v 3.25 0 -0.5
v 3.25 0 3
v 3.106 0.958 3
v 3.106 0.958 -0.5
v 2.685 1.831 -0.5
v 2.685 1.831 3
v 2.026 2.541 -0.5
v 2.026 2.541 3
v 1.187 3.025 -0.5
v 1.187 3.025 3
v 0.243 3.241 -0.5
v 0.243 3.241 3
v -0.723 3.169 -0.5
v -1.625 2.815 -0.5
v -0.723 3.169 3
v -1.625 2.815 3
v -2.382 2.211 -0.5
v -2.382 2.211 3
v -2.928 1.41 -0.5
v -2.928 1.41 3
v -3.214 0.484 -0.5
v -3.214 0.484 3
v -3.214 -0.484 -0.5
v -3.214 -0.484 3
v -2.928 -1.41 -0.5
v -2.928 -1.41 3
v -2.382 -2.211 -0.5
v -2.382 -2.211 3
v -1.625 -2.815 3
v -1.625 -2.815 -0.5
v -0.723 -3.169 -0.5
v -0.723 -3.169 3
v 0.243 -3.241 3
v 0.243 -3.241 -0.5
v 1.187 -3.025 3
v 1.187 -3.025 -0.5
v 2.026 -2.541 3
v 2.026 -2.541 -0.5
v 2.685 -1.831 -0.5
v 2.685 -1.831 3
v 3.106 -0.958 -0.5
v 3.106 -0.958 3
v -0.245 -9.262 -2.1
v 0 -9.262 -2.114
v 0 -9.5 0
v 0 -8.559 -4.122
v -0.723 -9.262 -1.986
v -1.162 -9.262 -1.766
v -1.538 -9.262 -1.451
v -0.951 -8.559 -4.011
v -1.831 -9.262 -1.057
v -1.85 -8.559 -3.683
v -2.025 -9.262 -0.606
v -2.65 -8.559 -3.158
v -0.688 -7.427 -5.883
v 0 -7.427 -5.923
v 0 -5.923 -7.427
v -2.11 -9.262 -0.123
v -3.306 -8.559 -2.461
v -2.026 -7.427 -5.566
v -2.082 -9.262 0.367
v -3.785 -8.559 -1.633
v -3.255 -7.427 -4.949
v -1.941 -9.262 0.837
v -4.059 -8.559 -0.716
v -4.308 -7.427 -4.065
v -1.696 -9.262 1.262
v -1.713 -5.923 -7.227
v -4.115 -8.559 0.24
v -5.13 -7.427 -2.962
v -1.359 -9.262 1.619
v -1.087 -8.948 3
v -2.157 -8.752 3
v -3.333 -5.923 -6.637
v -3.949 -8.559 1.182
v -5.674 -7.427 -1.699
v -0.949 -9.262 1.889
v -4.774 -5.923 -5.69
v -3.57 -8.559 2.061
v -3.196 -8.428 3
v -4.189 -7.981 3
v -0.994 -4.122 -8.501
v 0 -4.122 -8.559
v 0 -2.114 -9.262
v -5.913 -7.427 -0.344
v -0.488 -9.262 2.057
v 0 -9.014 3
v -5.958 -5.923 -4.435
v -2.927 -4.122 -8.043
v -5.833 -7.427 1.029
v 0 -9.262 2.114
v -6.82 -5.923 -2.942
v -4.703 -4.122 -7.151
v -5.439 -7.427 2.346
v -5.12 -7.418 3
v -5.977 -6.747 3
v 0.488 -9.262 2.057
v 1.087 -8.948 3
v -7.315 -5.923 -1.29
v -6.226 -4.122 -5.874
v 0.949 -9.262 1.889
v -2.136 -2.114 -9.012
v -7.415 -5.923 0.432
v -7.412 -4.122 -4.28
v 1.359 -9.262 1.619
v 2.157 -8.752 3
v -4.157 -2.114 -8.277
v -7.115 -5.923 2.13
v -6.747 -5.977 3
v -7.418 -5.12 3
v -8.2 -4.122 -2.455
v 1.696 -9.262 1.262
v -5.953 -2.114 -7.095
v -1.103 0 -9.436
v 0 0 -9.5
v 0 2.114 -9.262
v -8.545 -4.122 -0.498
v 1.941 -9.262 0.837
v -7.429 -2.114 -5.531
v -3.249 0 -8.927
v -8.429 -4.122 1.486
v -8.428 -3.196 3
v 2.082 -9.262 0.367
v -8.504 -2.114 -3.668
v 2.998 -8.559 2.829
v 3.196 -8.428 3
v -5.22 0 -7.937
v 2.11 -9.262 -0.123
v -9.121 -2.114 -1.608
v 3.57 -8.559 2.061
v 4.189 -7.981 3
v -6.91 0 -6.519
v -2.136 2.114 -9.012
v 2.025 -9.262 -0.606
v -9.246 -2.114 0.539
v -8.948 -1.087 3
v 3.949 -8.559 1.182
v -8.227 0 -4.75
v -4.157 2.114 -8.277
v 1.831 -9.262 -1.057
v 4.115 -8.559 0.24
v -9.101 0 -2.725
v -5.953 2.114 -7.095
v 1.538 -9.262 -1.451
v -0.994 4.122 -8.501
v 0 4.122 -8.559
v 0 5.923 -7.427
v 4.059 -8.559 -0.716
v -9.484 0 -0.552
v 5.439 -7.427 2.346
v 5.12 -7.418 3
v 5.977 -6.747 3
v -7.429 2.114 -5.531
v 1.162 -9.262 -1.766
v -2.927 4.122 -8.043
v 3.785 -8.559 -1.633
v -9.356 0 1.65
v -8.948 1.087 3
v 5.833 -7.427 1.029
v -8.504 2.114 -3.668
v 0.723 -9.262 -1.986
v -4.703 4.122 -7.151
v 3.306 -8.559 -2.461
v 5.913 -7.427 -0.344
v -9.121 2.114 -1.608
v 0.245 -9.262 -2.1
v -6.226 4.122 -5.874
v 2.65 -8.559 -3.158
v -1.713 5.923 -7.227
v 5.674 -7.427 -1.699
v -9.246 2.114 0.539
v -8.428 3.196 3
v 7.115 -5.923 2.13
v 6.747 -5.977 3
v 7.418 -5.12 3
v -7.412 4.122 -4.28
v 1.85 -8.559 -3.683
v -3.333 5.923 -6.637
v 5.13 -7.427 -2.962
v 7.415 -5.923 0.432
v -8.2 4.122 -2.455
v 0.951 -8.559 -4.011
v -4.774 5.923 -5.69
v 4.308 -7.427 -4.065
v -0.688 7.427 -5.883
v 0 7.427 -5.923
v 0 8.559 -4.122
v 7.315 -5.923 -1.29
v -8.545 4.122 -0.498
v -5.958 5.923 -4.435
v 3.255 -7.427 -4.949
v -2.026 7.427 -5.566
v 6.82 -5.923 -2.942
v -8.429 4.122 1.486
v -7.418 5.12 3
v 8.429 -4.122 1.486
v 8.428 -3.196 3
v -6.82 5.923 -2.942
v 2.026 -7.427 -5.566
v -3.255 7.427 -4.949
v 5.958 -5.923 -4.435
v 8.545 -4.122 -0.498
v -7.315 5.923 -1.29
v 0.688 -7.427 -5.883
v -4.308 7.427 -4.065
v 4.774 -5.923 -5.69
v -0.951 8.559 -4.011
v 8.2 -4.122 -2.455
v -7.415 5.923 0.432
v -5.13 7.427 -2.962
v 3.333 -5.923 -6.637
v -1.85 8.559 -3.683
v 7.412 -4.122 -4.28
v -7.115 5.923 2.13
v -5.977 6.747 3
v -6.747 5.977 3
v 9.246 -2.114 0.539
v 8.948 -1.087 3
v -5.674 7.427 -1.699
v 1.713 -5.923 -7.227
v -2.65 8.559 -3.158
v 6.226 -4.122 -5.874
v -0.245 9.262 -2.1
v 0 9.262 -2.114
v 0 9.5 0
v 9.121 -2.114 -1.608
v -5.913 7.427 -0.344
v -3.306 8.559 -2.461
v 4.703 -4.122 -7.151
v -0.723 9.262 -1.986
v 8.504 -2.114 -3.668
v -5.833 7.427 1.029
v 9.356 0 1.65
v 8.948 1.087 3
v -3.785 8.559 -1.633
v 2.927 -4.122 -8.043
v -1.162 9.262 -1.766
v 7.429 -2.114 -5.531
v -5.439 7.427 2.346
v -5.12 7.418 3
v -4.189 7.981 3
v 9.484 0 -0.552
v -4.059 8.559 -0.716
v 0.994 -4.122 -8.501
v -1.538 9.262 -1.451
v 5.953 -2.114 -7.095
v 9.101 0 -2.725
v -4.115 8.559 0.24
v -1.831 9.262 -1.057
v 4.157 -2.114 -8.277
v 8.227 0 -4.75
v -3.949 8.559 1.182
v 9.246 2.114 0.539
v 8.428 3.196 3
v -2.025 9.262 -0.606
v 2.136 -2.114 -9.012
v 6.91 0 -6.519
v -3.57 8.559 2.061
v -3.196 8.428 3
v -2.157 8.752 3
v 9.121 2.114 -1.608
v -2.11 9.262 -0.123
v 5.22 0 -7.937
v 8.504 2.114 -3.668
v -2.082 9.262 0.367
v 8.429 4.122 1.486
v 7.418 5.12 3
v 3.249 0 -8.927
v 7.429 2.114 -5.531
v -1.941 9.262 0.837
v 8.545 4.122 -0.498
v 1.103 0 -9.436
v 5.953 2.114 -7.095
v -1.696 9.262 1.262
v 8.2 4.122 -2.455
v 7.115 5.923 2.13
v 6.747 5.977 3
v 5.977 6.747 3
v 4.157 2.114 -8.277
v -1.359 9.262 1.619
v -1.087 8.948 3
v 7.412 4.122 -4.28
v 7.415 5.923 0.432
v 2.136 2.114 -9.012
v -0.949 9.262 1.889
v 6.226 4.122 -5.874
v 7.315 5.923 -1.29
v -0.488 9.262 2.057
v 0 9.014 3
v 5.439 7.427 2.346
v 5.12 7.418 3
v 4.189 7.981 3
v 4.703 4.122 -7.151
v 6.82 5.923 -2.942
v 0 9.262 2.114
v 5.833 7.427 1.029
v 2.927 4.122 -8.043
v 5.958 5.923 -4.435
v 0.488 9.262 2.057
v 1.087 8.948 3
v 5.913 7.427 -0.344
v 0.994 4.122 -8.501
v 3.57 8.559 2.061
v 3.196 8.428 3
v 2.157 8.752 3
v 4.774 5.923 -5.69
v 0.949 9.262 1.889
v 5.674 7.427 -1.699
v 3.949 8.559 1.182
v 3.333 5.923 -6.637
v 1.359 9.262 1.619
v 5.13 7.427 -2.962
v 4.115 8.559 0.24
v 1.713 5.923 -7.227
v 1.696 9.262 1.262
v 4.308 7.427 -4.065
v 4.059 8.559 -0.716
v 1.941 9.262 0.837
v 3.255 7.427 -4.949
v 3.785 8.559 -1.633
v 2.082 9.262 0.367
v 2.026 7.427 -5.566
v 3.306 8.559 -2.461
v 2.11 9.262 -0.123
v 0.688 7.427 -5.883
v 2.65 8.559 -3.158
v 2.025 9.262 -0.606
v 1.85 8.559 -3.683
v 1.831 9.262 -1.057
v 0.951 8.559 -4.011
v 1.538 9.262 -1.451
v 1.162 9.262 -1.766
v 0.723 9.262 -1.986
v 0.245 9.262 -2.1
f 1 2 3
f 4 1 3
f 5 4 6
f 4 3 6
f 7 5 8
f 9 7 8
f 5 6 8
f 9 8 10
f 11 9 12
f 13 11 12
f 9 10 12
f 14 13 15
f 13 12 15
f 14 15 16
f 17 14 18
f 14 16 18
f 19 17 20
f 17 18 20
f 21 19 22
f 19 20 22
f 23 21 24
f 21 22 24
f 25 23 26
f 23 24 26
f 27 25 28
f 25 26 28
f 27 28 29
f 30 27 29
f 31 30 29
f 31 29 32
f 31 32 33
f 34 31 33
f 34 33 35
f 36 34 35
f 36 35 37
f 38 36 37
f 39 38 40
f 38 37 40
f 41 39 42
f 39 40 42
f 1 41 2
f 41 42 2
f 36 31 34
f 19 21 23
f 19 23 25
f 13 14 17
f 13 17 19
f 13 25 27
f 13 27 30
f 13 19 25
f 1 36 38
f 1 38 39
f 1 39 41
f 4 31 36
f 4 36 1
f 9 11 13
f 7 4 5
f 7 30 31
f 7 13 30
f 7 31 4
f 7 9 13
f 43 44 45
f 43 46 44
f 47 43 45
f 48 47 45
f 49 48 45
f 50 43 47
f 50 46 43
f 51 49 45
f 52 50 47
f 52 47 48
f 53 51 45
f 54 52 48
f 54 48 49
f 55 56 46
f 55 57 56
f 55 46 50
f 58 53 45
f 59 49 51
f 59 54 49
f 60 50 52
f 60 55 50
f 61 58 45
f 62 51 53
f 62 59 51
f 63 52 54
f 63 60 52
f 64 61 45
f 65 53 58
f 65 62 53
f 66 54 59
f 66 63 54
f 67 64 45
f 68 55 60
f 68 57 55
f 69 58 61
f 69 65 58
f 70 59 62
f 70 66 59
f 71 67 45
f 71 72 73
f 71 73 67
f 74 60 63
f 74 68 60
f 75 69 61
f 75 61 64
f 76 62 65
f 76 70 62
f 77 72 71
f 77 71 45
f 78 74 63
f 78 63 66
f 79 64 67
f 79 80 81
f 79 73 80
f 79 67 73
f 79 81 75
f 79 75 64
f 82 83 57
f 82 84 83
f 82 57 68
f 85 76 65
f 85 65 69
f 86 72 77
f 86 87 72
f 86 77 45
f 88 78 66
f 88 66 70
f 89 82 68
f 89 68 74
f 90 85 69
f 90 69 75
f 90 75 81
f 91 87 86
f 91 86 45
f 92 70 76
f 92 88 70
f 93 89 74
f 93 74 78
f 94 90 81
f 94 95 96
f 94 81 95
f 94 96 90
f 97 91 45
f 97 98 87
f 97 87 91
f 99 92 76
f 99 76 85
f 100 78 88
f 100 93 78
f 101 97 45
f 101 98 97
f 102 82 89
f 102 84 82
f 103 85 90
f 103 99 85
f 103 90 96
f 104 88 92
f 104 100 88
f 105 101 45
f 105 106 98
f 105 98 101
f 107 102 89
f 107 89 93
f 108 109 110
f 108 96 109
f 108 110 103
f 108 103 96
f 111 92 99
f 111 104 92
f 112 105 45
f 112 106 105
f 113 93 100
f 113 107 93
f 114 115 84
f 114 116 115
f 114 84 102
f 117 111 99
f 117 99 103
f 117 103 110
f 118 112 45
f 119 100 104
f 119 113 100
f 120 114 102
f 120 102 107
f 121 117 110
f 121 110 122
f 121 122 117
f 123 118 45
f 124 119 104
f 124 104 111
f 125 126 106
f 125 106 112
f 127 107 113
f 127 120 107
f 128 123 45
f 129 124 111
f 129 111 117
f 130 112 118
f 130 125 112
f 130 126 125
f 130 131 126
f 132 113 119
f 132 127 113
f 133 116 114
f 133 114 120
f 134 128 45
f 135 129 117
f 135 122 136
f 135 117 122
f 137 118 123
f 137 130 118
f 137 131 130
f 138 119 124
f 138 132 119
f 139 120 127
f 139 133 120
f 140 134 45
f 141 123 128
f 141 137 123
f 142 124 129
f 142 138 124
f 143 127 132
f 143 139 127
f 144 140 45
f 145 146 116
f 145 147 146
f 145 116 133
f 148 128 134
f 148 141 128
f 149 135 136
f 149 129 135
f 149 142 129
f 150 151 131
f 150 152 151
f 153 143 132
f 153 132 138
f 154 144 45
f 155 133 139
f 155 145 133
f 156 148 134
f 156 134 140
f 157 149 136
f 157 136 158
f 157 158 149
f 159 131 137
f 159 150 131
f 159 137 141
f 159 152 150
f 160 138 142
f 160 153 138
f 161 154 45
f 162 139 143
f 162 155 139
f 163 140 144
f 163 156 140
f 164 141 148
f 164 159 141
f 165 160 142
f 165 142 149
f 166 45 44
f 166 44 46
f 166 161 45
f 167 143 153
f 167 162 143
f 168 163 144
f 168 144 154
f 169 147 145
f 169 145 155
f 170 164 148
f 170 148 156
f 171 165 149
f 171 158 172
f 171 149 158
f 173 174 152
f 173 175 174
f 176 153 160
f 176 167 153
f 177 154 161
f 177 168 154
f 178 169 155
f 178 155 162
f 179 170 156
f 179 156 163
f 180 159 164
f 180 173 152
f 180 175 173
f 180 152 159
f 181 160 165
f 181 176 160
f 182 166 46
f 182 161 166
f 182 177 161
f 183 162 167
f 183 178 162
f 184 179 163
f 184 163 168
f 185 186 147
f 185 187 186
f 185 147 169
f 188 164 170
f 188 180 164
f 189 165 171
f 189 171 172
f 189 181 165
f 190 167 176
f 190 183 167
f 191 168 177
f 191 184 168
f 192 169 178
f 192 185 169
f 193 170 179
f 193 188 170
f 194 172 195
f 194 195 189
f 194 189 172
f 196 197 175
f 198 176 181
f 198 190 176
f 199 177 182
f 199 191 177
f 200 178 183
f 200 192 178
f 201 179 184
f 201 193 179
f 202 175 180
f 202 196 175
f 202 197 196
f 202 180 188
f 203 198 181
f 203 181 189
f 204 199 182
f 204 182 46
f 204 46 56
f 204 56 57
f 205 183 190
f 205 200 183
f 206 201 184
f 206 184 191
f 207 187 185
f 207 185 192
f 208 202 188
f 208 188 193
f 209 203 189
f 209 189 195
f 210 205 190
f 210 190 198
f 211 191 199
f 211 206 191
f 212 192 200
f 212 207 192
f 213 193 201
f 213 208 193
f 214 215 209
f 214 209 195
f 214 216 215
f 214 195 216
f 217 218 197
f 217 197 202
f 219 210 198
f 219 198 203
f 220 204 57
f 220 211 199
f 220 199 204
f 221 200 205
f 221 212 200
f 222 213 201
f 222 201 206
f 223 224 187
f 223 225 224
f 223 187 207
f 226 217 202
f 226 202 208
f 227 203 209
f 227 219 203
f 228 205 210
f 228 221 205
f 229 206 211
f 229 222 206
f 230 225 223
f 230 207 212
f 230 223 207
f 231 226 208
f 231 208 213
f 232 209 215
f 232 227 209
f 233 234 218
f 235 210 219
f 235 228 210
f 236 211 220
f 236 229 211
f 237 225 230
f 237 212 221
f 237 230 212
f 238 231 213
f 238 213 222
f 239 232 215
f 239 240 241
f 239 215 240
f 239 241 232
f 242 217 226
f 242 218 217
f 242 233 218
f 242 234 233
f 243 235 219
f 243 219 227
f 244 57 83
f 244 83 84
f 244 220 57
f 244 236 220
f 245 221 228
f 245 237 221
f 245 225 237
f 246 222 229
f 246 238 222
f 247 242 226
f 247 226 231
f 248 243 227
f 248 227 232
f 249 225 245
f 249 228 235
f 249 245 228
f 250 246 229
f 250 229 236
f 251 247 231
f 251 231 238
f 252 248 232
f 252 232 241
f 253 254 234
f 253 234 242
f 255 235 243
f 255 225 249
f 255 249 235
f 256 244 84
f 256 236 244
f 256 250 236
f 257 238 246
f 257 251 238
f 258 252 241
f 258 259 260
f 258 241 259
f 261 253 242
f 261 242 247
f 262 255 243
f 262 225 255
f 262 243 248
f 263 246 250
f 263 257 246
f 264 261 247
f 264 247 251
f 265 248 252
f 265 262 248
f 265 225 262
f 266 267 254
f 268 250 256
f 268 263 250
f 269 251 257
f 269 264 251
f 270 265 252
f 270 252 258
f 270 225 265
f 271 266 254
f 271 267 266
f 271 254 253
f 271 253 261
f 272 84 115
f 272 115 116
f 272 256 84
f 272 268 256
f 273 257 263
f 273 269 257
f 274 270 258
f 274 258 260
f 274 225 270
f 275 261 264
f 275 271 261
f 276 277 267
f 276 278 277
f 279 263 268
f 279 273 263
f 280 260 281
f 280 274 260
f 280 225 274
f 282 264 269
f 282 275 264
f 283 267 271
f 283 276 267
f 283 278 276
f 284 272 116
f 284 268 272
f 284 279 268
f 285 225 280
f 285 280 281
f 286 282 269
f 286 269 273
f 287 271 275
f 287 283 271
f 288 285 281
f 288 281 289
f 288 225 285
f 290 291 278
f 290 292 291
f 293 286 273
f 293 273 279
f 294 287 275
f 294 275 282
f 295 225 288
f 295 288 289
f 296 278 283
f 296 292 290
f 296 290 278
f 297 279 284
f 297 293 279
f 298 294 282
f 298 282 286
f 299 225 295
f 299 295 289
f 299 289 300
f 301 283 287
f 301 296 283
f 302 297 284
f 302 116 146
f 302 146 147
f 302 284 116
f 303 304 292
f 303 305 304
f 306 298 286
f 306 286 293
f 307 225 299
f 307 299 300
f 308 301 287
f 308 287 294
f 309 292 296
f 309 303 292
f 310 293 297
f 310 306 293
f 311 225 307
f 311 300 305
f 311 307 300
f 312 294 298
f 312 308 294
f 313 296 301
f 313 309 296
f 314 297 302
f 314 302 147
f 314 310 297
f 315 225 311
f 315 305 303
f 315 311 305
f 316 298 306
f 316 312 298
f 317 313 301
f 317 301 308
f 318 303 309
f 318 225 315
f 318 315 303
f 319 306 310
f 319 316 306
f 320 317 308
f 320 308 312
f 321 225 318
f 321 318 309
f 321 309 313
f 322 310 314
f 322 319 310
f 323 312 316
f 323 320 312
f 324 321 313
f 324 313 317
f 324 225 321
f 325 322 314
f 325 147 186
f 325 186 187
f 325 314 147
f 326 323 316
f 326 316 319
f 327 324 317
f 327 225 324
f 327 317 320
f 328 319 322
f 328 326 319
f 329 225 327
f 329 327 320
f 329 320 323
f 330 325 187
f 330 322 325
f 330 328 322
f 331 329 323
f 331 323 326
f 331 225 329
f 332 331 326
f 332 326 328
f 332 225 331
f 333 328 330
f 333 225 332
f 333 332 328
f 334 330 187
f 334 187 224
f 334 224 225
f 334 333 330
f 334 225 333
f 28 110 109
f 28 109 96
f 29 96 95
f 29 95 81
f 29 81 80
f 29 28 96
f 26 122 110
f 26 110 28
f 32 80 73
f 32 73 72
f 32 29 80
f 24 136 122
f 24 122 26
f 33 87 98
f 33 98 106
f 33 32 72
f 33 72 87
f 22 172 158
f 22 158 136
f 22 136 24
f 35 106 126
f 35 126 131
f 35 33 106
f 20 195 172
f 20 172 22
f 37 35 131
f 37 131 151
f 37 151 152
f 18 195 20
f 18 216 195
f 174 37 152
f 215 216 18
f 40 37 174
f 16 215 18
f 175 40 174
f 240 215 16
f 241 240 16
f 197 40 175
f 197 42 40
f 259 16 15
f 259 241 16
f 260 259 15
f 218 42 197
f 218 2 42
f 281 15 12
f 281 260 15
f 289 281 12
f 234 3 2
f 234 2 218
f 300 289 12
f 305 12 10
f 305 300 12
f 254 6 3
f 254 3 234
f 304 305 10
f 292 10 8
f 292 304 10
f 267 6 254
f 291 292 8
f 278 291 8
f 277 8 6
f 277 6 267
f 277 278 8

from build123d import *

# Parameters (mm, degrees)
F2_W     = 25.694864
F2_H     = 24.584594
F3_DEPTH = 25
F6_R     = 3.25
F7_DEPTH = 3.5


with BuildPart() as f1:
    # F0 (on Right) → F1 (revolve)
    with BuildSketch(Plane.YZ):
        with BuildLine():
            Line((9.5, 0), (-9.5, 0))
            ThreePointArc((-9.5, 0), (0, -9.5), (9.5, 0))
        make_face()
    revolve(axis=Axis((0, 0, 0), (0, 1, 0)))


with BuildPart() as f3:
    # F2 (on Top) → F3 (new body)
    with BuildSketch(Plane.XY):
        Rectangle(F2_W, F2_H)
    extrude(amount=F3_DEPTH)


with BuildPart() as f3_1:
    # F4: moved
    add(f3.part.moved(Location((0, 0, 3))))


with BuildPart() as f1_1:
    add(f1.part)

    # F5: cut F3
    add(f3_1.part, mode=Mode.SUBTRACT)

    # F6 (on face) → F7 (cut)
    with BuildSketch(Plane.XY.offset(3)):
        Circle(F6_R)
    extrude(amount=-F7_DEPTH, mode=Mode.SUBTRACT)


solid = f1_1.part
